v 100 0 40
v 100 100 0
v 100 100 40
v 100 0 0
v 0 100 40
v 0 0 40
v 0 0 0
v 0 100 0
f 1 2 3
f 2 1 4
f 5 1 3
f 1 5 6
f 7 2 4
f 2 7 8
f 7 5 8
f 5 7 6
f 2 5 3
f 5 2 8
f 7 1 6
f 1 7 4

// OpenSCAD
module stand(length, width, thickness) { 
    difference () 
        cube ( [ length, width, thickness ] ) ;
    translate ( [ 5, 5, 0] ) {
        cylinder (r = 0.5, h = 1, $fn = 30) ;
    }
}
stand (100, 100, 40) ;

difference () { 
    stand (100, 100, 40) ;  {
        stand (50, 50, 80) ;
    }
}
